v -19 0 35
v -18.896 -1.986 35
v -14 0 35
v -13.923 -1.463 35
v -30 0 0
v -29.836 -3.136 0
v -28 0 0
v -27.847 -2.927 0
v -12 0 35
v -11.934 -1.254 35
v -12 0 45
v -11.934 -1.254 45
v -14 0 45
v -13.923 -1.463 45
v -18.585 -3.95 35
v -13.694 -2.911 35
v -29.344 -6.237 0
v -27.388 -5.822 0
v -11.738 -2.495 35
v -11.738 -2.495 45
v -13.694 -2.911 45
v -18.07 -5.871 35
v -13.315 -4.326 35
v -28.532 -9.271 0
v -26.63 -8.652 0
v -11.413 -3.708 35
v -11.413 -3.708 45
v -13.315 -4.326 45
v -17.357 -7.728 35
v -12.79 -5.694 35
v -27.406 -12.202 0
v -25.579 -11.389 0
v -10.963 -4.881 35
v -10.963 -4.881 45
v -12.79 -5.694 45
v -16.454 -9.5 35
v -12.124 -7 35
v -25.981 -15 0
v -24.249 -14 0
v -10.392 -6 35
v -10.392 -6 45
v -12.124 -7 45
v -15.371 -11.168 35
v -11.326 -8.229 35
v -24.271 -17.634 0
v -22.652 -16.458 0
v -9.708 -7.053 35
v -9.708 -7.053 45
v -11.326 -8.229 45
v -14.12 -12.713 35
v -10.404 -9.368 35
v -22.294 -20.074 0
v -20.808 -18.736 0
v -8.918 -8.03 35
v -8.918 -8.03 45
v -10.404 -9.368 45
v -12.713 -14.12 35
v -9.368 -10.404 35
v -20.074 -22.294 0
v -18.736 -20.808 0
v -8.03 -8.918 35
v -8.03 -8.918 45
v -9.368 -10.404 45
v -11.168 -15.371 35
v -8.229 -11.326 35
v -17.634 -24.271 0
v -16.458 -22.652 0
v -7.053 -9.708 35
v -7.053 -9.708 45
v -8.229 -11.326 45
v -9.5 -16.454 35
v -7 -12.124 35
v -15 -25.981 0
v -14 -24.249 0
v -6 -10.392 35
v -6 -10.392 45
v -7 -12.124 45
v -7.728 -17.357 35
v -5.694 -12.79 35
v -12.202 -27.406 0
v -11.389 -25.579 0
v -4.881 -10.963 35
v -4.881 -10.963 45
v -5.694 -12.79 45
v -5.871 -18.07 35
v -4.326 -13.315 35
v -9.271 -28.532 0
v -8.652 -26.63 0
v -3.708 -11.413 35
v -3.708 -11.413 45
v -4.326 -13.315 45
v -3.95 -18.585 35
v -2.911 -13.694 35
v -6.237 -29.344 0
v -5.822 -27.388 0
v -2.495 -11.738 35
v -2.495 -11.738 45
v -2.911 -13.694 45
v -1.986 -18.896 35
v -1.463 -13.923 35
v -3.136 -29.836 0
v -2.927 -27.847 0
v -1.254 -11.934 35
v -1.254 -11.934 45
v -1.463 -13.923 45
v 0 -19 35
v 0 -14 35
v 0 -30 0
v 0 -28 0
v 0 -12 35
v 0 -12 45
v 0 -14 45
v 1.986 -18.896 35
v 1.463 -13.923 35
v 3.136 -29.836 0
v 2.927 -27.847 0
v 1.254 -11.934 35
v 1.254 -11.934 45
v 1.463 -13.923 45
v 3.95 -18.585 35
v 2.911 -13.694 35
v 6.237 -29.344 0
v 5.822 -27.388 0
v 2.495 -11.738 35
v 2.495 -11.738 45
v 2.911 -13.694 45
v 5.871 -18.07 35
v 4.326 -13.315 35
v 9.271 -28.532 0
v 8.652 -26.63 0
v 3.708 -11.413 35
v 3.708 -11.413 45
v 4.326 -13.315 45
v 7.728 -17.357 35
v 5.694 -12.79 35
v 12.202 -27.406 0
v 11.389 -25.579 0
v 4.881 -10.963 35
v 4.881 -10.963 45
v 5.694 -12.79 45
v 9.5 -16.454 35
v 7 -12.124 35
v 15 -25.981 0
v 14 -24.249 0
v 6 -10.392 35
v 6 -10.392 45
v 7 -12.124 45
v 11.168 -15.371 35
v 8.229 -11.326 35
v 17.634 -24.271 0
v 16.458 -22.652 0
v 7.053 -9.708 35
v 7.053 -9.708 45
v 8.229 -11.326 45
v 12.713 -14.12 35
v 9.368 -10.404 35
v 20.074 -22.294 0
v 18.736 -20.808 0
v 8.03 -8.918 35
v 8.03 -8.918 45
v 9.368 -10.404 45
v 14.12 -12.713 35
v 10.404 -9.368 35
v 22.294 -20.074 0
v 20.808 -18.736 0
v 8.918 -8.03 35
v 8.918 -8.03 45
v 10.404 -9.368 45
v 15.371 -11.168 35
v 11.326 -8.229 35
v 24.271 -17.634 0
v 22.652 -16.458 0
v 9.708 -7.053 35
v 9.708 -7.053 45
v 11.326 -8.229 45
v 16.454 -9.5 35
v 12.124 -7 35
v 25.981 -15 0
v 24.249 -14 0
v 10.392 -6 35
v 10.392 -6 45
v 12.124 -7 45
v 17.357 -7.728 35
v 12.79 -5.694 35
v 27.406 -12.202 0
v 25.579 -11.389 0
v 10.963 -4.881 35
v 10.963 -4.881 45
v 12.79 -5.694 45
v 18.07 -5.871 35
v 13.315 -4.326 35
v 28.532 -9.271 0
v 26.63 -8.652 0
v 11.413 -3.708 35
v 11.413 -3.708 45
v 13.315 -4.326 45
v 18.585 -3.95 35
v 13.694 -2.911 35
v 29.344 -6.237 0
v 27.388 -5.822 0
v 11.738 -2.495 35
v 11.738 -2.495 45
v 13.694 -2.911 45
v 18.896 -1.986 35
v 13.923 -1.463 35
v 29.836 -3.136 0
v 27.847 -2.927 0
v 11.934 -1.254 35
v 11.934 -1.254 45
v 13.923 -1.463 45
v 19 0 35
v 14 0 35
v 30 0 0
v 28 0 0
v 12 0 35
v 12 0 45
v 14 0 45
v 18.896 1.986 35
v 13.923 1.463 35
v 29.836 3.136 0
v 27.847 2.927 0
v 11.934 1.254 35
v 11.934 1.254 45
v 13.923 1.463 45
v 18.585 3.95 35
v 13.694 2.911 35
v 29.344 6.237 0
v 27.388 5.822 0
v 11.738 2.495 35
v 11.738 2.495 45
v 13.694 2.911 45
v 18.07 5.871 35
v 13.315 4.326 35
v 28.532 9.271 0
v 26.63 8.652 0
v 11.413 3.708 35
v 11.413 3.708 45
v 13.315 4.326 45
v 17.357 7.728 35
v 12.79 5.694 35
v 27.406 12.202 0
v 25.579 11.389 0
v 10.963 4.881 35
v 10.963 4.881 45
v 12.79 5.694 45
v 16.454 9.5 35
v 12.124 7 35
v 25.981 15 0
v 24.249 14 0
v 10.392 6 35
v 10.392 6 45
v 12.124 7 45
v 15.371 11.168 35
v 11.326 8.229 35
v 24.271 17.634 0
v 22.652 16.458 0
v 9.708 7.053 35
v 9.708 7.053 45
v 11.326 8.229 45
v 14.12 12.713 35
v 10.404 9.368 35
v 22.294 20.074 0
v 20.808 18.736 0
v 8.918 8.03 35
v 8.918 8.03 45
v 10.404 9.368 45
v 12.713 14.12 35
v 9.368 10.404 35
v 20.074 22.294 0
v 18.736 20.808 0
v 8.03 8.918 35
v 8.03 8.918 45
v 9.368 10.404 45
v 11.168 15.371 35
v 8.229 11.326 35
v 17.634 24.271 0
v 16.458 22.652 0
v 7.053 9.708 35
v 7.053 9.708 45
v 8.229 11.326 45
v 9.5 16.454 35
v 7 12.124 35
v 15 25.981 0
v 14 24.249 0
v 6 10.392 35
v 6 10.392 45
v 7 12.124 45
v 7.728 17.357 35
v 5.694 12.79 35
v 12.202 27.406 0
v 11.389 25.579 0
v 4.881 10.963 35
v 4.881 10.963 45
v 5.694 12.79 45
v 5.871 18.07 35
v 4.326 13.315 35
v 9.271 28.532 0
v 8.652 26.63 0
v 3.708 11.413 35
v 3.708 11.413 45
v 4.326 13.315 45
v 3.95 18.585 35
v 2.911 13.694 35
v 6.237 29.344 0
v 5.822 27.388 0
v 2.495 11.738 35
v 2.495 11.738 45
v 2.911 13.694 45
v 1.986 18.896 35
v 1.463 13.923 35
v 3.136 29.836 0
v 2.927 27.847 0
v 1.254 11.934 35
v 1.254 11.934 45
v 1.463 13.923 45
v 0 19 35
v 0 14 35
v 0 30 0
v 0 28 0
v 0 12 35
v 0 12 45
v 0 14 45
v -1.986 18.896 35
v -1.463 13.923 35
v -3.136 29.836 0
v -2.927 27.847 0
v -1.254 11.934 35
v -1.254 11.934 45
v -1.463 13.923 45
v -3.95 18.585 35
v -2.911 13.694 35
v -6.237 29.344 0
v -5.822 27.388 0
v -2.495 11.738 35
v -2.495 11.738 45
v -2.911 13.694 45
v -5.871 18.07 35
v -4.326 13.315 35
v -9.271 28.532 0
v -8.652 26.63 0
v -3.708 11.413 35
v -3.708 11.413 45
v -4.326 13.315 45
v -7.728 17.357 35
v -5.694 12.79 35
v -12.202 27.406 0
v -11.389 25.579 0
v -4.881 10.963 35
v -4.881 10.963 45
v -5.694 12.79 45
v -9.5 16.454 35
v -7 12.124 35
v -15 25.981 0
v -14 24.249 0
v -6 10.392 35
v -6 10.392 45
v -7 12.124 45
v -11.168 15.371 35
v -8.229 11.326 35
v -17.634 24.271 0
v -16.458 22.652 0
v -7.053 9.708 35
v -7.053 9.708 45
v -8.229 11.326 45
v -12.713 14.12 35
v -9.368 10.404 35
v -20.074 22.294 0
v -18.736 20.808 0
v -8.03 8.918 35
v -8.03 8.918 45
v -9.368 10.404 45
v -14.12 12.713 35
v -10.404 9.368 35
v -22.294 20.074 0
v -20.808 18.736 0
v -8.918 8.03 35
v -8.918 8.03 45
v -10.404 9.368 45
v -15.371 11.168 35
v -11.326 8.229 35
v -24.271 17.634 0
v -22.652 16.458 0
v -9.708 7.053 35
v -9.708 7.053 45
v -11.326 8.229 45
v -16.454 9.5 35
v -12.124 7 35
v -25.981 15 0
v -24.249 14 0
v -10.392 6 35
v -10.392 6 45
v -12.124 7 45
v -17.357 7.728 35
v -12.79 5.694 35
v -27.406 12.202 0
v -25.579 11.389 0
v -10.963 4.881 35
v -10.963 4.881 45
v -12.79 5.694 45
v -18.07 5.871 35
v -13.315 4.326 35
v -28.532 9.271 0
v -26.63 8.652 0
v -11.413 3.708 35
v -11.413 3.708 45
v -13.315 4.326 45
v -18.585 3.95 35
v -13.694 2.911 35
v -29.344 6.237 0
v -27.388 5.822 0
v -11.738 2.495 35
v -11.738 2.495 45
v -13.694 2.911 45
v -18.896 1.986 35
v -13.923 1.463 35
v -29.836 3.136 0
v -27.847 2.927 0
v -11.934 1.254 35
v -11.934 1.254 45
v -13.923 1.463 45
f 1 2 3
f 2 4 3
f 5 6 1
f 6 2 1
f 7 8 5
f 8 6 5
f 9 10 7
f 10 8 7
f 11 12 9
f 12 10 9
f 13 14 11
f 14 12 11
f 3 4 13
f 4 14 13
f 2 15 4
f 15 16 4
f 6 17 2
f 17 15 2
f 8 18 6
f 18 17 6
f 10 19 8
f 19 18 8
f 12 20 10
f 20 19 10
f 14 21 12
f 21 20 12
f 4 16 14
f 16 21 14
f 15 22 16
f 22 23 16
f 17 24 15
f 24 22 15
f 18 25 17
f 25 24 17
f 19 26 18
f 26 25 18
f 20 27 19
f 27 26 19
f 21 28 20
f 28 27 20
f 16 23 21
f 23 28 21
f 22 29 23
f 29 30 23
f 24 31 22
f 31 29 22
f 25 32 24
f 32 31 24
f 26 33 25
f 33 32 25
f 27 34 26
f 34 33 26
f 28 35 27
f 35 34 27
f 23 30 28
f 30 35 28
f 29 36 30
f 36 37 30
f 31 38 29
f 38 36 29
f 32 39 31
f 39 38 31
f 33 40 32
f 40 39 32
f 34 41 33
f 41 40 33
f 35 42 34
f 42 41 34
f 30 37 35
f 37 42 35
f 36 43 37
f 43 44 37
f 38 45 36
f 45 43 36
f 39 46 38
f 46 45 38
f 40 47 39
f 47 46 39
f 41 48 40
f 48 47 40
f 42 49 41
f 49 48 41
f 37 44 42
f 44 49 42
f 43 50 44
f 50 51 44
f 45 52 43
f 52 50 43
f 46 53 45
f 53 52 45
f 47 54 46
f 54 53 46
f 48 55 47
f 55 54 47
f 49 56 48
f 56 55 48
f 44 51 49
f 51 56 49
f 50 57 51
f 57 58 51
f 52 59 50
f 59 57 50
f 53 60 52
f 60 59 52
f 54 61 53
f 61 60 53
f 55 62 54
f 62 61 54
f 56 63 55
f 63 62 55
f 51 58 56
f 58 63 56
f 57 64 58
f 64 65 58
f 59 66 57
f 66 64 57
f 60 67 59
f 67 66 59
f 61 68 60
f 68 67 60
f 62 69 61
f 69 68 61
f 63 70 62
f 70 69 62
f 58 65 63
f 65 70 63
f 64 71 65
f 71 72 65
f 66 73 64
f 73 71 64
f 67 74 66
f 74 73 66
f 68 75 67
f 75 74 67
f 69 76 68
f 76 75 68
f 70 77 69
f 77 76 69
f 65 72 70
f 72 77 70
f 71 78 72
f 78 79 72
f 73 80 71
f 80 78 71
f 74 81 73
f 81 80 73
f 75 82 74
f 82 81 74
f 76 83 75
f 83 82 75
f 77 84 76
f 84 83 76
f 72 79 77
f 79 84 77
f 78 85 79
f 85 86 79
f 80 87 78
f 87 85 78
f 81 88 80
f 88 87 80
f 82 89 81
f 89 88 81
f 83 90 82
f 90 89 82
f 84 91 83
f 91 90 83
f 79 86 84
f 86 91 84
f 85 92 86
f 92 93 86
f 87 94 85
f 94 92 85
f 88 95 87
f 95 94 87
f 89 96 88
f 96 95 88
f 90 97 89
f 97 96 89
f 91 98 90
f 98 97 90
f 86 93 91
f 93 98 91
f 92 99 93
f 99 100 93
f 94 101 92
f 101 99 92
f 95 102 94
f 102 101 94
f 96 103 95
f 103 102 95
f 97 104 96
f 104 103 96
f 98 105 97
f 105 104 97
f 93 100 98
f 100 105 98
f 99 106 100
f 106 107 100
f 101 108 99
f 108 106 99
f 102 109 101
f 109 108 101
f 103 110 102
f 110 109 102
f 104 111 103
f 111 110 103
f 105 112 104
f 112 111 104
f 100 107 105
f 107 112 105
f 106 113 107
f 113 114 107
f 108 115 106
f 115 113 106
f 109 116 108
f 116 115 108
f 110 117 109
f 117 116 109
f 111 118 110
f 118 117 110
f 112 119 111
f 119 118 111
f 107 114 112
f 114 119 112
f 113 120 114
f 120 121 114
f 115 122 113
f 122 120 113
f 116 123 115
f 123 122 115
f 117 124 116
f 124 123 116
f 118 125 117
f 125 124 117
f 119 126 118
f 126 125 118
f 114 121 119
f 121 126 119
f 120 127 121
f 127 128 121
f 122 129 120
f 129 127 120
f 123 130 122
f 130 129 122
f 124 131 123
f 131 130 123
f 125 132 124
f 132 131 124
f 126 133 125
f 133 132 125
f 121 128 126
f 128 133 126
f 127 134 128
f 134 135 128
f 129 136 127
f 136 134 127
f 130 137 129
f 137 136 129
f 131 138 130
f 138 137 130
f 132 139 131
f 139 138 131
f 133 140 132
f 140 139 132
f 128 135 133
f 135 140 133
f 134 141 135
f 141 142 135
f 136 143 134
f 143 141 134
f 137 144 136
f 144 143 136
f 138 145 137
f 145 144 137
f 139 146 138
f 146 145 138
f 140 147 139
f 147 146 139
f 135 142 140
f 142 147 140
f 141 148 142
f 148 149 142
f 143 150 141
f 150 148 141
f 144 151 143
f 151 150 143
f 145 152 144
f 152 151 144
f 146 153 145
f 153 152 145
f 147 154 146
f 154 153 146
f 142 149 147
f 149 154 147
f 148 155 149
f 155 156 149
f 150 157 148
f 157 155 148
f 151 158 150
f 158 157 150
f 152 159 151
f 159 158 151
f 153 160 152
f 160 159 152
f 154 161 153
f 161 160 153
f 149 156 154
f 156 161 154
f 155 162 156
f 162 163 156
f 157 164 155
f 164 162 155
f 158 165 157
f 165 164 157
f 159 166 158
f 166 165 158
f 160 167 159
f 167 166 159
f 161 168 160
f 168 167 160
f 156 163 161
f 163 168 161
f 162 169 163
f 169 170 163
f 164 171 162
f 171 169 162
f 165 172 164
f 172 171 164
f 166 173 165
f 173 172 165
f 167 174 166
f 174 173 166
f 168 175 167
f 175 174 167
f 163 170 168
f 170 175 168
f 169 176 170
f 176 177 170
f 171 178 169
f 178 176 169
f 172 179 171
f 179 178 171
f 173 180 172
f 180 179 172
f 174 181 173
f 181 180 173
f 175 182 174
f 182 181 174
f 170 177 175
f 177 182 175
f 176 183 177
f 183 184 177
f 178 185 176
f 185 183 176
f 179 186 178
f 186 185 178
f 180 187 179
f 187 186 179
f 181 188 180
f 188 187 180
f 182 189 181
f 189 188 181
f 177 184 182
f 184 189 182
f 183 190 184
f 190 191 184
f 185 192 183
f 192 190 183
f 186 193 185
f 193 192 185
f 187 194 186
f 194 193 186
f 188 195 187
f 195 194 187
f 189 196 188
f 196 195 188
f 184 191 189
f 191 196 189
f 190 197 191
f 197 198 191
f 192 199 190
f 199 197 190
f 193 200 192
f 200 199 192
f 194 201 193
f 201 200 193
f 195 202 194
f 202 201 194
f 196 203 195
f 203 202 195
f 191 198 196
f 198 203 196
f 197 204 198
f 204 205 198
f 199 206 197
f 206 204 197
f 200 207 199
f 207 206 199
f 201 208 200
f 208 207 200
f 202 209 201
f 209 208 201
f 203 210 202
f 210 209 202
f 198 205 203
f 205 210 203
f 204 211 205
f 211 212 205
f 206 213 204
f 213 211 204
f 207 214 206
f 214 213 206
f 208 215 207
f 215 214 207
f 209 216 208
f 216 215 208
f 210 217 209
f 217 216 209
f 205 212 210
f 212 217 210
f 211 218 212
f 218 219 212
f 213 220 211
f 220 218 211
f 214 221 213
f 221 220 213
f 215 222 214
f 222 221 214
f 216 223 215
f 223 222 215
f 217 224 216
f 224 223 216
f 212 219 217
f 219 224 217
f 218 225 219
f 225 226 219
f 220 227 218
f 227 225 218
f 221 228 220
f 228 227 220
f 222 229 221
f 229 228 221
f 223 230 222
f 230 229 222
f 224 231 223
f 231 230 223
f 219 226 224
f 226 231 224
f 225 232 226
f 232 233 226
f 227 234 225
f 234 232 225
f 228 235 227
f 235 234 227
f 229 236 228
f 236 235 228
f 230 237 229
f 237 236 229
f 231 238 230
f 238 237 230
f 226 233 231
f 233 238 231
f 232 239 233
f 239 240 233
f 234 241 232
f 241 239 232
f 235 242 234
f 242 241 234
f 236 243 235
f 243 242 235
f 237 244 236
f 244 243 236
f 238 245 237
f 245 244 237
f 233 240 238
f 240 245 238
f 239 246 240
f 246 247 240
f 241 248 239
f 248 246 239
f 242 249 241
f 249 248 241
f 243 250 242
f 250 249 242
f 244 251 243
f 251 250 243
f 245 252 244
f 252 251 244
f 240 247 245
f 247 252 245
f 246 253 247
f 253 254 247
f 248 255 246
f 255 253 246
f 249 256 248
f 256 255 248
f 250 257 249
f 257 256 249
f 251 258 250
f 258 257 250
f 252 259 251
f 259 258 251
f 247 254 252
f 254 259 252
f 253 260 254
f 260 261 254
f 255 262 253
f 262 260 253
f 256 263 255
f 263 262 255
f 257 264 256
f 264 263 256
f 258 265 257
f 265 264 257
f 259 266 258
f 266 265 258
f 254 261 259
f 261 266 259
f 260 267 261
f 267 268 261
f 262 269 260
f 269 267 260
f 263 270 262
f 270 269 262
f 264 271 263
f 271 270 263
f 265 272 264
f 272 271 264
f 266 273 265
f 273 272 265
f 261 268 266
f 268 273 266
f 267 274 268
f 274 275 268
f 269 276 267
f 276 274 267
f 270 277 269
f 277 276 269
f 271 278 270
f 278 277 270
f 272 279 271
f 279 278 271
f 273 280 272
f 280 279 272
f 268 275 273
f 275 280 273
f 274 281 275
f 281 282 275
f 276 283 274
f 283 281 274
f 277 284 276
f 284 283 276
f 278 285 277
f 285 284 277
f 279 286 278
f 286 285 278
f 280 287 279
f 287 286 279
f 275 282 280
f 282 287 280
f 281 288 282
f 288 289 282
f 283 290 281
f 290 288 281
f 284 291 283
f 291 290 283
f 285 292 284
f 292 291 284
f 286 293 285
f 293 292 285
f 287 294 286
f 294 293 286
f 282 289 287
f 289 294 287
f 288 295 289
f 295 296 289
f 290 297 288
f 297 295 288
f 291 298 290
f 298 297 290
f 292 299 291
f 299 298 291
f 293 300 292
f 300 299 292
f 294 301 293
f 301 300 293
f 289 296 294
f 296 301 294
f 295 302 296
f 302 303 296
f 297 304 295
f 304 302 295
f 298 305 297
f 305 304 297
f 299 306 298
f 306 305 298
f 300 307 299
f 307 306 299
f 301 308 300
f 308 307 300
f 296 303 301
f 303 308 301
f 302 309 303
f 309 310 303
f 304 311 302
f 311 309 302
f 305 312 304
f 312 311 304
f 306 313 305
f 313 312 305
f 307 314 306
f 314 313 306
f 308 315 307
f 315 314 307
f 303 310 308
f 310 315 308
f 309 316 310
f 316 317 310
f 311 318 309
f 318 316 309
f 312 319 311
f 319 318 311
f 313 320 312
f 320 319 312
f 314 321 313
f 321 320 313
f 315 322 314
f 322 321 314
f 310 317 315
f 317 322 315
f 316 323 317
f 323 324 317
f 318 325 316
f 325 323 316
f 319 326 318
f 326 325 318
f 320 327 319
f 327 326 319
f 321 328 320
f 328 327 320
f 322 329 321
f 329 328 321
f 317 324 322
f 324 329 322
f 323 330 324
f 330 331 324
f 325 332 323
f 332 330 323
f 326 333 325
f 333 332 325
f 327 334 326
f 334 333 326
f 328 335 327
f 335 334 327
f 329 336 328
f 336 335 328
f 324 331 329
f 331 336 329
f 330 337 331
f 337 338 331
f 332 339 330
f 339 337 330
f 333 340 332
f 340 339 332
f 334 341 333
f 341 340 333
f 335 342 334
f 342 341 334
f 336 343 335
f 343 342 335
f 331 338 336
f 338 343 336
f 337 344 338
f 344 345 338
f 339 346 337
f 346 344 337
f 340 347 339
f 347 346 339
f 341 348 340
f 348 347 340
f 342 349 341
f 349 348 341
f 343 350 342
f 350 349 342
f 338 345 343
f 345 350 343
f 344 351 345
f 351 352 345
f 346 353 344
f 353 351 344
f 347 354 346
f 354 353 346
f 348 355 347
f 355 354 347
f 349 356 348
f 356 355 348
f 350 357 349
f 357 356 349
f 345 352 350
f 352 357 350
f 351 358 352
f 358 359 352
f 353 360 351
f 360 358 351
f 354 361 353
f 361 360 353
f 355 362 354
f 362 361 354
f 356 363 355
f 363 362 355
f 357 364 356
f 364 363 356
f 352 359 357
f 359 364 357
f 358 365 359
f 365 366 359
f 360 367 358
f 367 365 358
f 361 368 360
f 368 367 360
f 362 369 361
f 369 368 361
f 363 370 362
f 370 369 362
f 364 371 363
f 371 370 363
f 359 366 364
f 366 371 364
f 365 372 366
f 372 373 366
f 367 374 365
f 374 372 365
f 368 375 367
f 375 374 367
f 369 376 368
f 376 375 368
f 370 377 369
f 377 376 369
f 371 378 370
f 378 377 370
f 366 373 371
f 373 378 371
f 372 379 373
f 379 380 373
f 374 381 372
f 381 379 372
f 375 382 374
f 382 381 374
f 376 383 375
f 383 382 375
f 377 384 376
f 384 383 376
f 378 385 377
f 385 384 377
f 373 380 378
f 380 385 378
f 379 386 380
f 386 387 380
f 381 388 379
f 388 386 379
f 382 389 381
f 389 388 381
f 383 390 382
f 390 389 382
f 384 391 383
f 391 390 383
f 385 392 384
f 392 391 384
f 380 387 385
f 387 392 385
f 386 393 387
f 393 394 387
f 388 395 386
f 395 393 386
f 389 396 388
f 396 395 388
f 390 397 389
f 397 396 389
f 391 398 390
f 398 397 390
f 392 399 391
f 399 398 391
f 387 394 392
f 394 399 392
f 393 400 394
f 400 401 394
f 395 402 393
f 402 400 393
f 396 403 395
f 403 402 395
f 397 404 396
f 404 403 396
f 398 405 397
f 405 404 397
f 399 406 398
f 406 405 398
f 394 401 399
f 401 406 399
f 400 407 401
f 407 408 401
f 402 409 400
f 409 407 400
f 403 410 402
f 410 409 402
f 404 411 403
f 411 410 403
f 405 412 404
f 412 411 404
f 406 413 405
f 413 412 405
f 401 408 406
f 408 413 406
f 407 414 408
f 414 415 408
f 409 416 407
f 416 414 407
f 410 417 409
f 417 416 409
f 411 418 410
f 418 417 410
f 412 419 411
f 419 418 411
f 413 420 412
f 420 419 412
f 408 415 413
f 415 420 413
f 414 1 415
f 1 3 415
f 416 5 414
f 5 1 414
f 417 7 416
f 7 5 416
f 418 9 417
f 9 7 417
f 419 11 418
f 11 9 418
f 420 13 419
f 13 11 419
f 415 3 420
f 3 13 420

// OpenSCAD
 shape = [ [12,0],
            [14,0],
          [14,10],
          [19,10],
          [30,45],
          [28,45],
          [12,10]
         ];

translate([0,0,45]) rotate( [180, 0, 0]) {
   rotate_extrude($fn=60) polygon(points = shape);
}
/*

All Dimmenstion in mm

od_top : Diameter of top of funnel
id_mill : Inner diameter of pepper mill
od_mill : Outer diameter of pepper mill
depth : How deep to insert in mill

funnel_profile( id_mill, op_mill, od_top, depth )


[ [(id_mill/2)-2,0],
           [(id_mill/2),0],
         [(id_mill/2),10],
         [(od_mill/2),depth],
         [30,(od_top/2)],
         [28,(od_top/2)],
         [(id_mill/2)-2,depth]
        ];

*/
